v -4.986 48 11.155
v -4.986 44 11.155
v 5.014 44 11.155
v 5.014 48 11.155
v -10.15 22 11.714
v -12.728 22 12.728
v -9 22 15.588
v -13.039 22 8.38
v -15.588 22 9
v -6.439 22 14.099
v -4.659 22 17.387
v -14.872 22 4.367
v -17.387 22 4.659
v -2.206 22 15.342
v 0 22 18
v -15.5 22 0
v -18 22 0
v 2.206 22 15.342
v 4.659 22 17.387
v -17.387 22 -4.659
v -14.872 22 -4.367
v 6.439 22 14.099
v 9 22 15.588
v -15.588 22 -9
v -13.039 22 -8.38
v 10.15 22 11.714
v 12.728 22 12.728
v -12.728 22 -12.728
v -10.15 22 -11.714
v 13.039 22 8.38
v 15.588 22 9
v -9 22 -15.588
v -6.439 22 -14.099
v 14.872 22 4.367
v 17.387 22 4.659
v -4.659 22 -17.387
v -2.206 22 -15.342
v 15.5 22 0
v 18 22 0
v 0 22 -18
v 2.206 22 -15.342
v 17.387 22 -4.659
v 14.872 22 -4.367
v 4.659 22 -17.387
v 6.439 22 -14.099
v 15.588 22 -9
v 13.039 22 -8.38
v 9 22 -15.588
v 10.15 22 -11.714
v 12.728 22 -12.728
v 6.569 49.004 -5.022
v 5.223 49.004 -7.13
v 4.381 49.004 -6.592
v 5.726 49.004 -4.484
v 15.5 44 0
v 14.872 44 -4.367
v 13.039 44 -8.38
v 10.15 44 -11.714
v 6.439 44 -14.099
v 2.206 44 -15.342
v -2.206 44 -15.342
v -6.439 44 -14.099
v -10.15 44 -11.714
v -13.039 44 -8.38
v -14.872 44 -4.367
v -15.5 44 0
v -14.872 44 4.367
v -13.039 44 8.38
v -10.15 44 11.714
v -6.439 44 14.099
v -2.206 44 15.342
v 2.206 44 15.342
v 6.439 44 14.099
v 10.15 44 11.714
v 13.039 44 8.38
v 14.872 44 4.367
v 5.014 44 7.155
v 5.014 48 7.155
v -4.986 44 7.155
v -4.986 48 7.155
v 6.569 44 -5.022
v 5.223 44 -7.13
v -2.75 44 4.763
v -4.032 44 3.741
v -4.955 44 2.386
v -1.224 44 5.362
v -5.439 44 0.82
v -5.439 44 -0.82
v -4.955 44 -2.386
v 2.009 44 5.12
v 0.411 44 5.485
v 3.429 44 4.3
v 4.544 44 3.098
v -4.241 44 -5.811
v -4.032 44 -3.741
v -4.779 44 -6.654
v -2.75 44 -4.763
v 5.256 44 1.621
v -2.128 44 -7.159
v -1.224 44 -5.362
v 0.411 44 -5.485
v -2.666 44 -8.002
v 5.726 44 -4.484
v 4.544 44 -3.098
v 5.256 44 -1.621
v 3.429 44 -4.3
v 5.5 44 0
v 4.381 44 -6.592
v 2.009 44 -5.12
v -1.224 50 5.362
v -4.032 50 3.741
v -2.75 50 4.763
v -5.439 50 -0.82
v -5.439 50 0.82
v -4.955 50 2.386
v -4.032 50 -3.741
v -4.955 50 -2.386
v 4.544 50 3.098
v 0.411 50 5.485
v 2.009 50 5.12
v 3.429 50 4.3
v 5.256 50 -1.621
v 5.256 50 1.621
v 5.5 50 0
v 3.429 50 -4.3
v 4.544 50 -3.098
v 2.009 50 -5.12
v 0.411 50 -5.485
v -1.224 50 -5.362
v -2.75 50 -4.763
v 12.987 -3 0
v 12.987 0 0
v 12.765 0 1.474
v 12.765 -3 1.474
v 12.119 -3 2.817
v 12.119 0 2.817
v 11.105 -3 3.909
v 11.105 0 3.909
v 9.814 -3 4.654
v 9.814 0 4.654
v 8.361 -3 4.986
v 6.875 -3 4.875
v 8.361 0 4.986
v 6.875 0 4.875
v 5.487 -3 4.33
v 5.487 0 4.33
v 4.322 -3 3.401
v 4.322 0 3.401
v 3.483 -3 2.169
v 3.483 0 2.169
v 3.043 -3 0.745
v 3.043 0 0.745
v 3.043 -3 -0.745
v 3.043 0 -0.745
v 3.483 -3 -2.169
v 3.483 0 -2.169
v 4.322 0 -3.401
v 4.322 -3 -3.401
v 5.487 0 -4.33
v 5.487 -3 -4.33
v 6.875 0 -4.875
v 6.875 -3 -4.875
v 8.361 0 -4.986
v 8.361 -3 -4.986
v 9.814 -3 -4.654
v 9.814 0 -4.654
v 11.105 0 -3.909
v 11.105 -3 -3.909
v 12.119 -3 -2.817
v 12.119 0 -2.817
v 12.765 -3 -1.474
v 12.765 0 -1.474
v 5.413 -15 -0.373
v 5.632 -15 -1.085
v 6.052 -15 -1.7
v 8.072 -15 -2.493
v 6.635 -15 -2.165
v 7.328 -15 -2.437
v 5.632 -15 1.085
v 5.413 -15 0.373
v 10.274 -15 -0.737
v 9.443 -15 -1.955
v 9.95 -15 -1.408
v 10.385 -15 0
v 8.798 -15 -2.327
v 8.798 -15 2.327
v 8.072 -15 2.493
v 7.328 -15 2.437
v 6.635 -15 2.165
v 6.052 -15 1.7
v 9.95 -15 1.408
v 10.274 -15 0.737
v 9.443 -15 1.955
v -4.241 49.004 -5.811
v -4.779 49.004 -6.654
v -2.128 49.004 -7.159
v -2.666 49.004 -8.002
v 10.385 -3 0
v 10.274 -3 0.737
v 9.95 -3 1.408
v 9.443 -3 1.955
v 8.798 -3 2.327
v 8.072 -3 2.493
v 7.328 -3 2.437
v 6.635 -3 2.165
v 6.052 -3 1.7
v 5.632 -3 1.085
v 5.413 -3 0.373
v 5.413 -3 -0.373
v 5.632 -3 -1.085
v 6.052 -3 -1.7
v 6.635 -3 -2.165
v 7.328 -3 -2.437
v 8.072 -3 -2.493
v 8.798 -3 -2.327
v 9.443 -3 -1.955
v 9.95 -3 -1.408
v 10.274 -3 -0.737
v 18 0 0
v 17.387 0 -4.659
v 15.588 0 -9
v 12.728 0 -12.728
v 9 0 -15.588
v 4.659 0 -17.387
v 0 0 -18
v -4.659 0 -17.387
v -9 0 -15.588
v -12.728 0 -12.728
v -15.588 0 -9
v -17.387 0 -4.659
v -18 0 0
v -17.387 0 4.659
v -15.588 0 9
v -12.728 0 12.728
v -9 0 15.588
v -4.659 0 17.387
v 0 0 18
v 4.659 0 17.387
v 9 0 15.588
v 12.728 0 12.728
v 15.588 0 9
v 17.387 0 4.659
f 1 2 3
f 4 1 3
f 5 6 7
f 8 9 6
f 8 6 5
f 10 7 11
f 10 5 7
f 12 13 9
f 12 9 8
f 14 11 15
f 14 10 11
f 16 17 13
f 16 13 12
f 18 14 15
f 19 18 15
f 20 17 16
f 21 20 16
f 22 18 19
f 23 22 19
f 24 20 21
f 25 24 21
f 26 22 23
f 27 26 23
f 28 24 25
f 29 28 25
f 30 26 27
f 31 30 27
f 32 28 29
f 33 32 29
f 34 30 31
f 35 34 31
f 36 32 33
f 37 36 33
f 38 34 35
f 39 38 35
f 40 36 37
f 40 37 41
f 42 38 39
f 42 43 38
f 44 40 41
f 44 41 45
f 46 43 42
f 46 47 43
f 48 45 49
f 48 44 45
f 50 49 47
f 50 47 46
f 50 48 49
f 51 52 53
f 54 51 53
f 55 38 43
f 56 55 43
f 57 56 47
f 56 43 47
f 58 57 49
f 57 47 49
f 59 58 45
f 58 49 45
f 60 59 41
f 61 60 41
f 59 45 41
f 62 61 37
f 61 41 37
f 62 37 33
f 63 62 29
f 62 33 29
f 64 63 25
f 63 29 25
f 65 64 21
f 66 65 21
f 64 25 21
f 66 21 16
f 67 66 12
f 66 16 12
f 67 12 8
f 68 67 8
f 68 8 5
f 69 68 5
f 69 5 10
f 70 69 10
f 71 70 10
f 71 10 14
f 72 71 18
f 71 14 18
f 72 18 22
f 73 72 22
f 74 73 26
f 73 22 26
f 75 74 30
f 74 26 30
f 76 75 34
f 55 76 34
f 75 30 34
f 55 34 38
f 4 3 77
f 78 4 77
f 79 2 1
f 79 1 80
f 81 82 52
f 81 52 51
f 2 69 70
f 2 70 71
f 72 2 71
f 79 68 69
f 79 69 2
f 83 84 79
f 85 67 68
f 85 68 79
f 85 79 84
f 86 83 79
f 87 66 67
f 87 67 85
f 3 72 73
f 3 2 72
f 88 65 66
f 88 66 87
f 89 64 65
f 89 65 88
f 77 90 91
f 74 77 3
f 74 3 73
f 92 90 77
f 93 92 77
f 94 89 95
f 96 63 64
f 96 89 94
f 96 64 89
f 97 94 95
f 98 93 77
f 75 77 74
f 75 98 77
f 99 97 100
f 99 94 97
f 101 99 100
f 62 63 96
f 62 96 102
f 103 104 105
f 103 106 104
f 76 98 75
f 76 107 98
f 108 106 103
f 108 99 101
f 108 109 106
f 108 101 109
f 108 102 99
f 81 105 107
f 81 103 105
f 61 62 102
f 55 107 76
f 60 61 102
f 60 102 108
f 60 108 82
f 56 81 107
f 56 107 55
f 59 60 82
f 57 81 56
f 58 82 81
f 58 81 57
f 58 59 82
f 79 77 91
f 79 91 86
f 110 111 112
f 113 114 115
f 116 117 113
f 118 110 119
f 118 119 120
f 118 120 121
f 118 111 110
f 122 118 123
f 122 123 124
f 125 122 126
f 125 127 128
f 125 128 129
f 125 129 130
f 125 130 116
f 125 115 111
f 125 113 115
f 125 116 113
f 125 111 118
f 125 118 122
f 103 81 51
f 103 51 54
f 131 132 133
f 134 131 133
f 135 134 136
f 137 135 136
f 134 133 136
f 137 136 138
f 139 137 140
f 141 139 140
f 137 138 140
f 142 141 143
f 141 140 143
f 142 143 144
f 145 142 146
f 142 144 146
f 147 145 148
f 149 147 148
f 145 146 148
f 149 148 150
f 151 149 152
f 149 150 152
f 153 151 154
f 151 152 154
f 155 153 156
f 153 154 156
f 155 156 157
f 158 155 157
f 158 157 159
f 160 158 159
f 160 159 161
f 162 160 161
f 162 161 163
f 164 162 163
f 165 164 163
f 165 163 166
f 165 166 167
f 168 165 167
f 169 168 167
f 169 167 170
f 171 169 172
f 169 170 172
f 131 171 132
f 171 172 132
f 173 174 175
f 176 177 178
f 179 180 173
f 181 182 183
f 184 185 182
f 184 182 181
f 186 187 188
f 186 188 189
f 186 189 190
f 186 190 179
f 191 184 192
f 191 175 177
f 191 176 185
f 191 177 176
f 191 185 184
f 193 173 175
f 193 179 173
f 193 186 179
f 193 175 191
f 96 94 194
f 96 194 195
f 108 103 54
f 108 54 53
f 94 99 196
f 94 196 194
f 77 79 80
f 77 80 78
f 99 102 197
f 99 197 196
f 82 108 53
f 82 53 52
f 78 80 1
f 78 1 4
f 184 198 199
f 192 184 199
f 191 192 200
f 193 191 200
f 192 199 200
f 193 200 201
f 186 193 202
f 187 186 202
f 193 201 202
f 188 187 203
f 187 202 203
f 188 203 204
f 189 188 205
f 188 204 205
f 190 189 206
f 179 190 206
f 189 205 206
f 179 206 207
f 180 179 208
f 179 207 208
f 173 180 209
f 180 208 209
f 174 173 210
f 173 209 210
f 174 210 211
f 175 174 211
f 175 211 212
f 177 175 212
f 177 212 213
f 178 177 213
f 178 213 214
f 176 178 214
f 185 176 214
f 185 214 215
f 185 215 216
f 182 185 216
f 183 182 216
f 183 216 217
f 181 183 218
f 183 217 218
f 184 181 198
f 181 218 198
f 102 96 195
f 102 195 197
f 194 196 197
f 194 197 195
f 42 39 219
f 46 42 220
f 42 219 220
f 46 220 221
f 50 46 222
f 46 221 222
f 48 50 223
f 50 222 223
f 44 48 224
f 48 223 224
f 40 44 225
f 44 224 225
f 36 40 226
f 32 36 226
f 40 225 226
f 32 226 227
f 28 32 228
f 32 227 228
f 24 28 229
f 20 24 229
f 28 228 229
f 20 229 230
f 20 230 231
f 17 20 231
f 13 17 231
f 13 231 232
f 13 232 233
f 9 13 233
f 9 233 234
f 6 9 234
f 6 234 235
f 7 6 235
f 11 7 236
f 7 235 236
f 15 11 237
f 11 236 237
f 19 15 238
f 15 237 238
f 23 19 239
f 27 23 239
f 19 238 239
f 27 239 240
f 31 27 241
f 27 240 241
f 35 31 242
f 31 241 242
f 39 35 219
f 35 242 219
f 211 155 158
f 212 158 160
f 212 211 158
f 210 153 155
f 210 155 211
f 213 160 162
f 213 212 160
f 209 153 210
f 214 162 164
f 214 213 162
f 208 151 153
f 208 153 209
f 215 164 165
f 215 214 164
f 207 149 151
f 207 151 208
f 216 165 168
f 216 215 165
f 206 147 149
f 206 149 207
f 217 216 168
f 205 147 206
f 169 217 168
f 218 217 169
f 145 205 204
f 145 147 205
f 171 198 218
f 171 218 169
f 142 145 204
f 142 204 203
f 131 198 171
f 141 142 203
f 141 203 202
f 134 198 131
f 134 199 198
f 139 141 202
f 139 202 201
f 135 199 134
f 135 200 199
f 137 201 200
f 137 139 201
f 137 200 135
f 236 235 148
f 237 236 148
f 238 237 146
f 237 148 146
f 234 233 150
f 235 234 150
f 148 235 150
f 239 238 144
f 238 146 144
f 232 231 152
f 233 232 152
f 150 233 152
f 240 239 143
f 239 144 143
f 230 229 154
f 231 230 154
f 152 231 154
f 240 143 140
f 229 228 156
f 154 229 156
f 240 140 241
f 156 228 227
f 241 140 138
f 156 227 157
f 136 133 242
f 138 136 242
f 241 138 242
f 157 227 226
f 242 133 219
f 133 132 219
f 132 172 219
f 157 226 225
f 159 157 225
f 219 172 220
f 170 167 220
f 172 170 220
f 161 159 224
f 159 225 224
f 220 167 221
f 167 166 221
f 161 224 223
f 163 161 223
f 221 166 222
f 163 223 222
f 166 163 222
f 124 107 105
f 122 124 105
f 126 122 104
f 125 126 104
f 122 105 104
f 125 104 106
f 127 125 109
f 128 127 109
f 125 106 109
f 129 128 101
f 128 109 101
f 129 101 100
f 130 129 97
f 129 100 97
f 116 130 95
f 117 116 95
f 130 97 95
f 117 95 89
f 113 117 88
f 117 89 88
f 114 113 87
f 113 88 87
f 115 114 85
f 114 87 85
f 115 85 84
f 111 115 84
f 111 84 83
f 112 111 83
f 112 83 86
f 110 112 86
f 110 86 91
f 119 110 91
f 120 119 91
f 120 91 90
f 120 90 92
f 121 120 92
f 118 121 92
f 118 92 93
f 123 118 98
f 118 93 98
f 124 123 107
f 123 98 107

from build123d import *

# Parameters (mm, degrees)
SKETCH_1_R        = 18
EXTRUDE_1_DEPTH   = 22
SKETCH_2_R        = 15.5
EXTRUDE_2_DEPTH   = 22
SKETCH_3_R        = 5
EXTRUDE_4_DEPTH   = 3
SKETCH_4_R        = 2.5
EXTRUDE_5_DEPTH   = 12
SKETCH_5_R        = 5.5
EXTRUDE_6_DEPTH   = 6
EXTRUDE_1_2_DEPTH = 5.003884266
SKETCH_7_W        = 10
SKETCH_7_H        = 4
EXTRUDE_7_DEPTH   = 4


with BuildPart() as part:
    # 草图1 → Extrude 1 (new body)
    with BuildSketch(Plane(origin=(0, 0, 0), x_dir=(1, 0, 0), z_dir=(0, 1, 0))):
        Circle(SKETCH_1_R)
    extrude(amount=EXTRUDE_1_DEPTH)

    # 草图2 → 凸台-拉伸2 (add)
    with BuildSketch(Plane(origin=(0, 22, 0), x_dir=(1, 0, 0), z_dir=(0, 1, 0))):
        Circle(SKETCH_2_R)
    extrude(amount=EXTRUDE_2_DEPTH)

    # 草图3 → 凸台-拉伸4 (add)
    with BuildSketch(Plane.XZ):
        with Locations((7.987474049, 0)):
            Circle(SKETCH_3_R)
    extrude(amount=EXTRUDE_4_DEPTH)

    # 草图4 → 凸台-拉伸5 (add)
    with BuildSketch(Plane.XZ.offset(3)):
        with Locations((7.884702341, 0)):
            Circle(SKETCH_4_R)
    extrude(amount=EXTRUDE_5_DEPTH)

    # 草图5 → 凸台-拉伸6 (add)
    with BuildSketch(Plane(origin=(0, 44, 0), x_dir=(1, 0, 0), z_dir=(0, 1, 0))):
        Circle(SKETCH_5_R)
    extrude(amount=EXTRUDE_6_DEPTH)

    # 草图6 → Extrude 1 2 (add)
    with BuildSketch(Plane(origin=(0, 44, 0), x_dir=(1, 0, 0), z_dir=(0, 1, 0))):
        Polygon((-4.778535484, 6.653759351), (-2.666405598, 8.001927364), (-2.128370145, 7.159005154), (-4.240500031, 5.810837142), align=None)
        Polygon((5.223428842, 7.129609036), (6.568517474, 5.022303512), (5.725595265, 4.484268059), (4.380506633, 6.591573583), align=None)
    extrude(amount=EXTRUDE_1_2_DEPTH)

    # 草图7 → 凸台-拉伸7 (add)
    with BuildSketch(Plane(origin=(0, 44, 0), x_dir=(1, 0, 0), z_dir=(0, 1, 0))):
        with Locations((0.014439493, -9.155250873)):
            Rectangle(SKETCH_7_W, SKETCH_7_H)
    extrude(amount=EXTRUDE_7_DEPTH)


solid = part.part
